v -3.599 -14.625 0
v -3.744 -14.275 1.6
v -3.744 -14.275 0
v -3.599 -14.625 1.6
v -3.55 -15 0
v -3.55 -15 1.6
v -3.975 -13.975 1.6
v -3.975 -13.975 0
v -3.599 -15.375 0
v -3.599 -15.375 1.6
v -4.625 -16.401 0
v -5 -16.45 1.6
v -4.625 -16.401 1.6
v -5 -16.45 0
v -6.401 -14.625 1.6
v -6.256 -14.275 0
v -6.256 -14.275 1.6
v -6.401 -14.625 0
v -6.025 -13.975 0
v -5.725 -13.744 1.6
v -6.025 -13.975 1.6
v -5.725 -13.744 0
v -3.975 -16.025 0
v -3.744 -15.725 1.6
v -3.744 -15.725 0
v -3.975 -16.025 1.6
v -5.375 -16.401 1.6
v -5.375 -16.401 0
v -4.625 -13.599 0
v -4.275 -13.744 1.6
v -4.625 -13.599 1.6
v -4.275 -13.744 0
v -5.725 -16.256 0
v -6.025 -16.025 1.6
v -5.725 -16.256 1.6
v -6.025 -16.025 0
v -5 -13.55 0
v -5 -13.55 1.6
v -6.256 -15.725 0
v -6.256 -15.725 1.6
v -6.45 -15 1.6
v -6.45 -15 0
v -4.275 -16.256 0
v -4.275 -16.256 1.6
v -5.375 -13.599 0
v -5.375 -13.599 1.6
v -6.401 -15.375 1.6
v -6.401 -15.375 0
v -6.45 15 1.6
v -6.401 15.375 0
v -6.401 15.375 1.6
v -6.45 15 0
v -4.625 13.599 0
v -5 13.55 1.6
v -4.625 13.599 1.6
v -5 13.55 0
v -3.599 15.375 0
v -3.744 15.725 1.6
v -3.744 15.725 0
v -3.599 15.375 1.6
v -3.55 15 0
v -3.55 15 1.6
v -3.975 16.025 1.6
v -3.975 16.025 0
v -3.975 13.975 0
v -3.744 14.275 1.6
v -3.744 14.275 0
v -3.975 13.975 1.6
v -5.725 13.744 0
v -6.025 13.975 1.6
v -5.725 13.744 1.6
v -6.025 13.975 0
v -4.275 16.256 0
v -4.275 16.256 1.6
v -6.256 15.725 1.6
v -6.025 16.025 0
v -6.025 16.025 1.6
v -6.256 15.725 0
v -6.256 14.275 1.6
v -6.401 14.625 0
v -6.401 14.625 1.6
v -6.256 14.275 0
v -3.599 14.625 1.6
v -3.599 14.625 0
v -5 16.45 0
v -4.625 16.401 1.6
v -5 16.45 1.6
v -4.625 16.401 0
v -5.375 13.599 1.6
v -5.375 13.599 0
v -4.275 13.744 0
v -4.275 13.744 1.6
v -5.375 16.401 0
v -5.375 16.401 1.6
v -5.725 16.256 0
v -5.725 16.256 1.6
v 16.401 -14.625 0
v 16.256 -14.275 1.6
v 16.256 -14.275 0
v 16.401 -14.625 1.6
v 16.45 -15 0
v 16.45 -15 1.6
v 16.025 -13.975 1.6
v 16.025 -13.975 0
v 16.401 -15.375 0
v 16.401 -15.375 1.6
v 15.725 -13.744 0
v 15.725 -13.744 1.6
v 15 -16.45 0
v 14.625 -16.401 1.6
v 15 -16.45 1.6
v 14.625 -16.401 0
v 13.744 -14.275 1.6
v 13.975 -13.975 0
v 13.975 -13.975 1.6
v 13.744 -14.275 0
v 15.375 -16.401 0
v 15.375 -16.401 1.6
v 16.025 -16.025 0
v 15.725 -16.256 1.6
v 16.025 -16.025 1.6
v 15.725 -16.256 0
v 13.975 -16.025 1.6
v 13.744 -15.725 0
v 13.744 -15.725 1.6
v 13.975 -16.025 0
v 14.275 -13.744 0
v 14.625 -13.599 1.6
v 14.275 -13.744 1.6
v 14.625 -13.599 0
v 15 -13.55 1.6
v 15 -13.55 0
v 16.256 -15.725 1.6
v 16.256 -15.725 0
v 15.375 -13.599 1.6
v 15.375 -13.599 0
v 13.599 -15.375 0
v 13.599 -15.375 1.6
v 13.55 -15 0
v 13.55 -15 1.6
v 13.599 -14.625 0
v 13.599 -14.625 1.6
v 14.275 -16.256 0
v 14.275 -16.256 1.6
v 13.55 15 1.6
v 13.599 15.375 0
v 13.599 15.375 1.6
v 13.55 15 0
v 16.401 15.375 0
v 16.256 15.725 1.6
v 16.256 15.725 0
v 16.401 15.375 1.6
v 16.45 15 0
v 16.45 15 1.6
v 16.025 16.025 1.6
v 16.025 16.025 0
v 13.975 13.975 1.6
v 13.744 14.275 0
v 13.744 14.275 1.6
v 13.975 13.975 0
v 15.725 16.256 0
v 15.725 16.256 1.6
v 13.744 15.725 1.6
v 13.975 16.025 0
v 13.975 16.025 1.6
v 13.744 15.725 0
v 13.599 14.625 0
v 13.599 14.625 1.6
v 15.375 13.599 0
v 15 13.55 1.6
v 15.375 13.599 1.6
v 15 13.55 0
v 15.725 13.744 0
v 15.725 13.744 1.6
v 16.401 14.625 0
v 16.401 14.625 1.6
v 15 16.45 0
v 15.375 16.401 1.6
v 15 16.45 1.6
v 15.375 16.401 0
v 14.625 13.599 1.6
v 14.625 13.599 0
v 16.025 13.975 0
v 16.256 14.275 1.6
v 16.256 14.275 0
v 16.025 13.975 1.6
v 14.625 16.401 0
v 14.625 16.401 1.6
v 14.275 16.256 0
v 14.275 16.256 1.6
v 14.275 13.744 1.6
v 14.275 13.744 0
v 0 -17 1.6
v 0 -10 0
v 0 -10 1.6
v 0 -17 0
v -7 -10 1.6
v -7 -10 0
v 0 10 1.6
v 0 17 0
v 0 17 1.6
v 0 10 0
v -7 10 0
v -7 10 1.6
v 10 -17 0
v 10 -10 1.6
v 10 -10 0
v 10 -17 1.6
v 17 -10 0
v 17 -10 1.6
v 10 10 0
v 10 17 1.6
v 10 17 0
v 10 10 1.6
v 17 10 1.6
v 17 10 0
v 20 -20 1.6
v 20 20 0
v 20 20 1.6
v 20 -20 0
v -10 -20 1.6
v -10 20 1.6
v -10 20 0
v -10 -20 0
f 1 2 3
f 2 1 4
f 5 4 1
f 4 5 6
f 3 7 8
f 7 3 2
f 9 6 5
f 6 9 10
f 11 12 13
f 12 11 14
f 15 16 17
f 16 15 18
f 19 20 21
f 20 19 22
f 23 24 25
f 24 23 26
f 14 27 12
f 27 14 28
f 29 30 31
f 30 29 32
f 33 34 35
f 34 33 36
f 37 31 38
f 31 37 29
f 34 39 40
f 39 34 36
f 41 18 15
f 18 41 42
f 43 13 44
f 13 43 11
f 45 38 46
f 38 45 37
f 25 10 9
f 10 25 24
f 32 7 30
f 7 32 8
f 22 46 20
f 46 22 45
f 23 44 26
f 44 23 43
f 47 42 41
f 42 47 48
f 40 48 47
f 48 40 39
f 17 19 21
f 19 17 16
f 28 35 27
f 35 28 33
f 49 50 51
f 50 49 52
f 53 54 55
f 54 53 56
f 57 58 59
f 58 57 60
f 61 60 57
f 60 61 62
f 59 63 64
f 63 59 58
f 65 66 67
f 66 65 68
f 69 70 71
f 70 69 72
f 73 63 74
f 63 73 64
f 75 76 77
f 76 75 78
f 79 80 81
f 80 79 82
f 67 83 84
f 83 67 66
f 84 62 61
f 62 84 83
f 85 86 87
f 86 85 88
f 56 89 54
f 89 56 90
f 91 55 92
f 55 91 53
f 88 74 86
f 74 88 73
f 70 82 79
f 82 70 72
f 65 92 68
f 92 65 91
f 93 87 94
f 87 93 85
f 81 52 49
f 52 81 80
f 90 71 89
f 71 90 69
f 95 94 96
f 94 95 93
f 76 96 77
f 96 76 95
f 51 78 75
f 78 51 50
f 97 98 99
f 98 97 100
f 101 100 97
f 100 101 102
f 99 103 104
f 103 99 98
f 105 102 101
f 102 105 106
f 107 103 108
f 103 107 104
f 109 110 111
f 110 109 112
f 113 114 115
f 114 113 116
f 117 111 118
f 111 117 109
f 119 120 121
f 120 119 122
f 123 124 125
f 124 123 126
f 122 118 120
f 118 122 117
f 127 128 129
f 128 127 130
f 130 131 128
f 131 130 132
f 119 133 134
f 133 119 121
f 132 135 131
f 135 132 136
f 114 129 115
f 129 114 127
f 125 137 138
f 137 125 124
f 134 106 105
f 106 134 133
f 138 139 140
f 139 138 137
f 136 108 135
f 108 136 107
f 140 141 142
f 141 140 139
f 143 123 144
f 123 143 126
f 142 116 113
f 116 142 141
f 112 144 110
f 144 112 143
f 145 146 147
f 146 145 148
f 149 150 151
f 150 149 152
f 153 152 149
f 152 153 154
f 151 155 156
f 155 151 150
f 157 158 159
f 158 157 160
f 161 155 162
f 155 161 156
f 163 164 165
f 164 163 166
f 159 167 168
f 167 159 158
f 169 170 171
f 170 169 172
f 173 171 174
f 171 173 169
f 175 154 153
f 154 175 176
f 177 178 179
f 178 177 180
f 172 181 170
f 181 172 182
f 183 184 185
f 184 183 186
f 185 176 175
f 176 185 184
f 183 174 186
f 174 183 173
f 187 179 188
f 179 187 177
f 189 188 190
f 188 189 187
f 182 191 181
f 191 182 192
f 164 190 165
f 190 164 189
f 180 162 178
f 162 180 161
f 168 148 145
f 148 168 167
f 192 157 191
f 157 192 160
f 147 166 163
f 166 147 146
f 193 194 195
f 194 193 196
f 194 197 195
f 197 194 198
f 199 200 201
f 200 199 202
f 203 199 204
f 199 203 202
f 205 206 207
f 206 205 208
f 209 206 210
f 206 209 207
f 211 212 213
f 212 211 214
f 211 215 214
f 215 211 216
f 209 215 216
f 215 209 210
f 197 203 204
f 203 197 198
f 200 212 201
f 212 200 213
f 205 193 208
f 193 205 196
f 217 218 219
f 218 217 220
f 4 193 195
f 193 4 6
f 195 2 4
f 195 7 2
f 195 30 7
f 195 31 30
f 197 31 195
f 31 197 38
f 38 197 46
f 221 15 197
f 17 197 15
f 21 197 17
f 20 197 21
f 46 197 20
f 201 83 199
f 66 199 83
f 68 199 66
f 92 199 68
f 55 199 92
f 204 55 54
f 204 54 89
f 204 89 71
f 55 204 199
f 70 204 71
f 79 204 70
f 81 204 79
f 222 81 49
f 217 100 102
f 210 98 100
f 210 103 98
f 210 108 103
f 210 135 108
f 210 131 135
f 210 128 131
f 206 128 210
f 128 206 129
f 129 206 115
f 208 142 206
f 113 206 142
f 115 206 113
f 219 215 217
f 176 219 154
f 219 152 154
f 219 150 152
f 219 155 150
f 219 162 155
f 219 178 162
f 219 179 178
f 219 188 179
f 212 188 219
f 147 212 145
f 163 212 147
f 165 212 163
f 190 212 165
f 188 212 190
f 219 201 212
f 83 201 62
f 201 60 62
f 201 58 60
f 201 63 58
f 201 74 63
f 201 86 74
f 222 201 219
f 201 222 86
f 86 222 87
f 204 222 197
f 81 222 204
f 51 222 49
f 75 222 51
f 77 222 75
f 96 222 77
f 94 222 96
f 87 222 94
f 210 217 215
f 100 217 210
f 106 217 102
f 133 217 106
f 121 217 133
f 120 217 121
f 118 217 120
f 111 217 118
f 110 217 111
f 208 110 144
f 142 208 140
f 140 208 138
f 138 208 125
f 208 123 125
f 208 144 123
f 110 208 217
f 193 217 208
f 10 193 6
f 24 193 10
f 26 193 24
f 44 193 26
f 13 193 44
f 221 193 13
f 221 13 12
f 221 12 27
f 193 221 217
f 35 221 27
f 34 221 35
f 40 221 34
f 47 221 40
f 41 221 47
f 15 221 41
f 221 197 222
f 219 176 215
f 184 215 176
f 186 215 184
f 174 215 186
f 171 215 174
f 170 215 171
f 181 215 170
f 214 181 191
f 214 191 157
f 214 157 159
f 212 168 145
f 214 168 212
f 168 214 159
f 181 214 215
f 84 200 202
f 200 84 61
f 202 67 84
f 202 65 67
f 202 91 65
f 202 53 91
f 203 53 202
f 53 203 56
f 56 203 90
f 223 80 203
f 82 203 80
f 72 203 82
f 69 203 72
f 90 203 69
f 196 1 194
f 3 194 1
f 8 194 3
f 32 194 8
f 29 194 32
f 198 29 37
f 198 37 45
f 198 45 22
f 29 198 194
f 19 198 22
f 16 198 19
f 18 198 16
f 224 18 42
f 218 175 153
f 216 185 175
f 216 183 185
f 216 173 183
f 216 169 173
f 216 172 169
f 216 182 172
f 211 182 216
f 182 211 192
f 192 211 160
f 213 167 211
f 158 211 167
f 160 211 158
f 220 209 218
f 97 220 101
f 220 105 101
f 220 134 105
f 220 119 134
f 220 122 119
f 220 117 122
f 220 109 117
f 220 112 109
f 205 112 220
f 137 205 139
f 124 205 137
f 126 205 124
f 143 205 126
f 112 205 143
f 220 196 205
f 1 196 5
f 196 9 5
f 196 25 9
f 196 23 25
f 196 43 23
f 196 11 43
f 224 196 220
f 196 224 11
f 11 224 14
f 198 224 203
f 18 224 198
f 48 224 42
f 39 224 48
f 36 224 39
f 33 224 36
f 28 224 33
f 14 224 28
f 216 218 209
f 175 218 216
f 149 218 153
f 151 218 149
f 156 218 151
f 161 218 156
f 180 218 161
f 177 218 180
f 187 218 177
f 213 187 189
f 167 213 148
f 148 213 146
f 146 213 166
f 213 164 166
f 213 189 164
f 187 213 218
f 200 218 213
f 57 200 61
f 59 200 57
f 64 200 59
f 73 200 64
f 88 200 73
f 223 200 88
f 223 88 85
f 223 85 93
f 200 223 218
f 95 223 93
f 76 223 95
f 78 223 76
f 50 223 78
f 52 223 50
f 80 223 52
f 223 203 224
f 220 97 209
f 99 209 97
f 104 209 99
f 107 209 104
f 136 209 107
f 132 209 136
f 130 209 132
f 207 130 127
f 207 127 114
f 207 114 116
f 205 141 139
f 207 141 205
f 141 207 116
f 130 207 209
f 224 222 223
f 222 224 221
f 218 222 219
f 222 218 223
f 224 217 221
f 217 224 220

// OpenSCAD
// file: ../../screw-post/screw-post.scad
//-----------------------------------------------------------------------
// Screw post: a round post off the floor that a board screws down onto
//
// Two ways to fix:
//   "nut"  clearance hole through the post and floor; the nut sits in a hex
//          trap in the floor's underside, so the screw goes in from the top
//   "tap"  a pilot hole the screw cuts its own thread in (one or two fittings
//          in PLA/PETG); blind, the floor stays whole underneath
// and "head" for a screw up from below (head in a counterbore, nut on top).
//
// Modules, all in the same frame:
//   screwPostGhost()     the screw (and nut), for previews
//   screwPost()          the post: add to the floor
//   screwPostFloorCut()  subtract from the floor: nut trap / counterbore and hole
//
// Frame: origin on the floor top, on the post's axis. Z up; the floor is
// Z = -floorThick .. 0. Units: mm.
//
// Sizes: "M2", "M2.5", "M3". screwPostScrew(size, ...) says which screw length
// reaches, so a project can assert it has that screw in the kit.
//-----------------------------------------------------------------------

//-- [name, screw Ø, nut across flats, nut thick, head Ø, head height, tap hole, post Ø]
//-- Nuts ISO 4032; heads ISO 7380 button. Tap holes: the usual ~0.8 x Ø for plastic
screwSizes = [
  ["M2",   2.0, 4.0, 1.6, 3.5, 1.1, 1.6, 5.0],
  ["M2.5", 2.5, 5.0, 2.0, 4.4, 1.4, 2.1, 6.0],    // head 4.4: measured on the kit's M2.5 (controller base)
  ["M3",   3.0, 5.5, 2.4, 5.7, 1.65, 2.5, 7.0],
];

screwHoleClear = 0.4;     // added to the screw Ø for a clearance hole
screwNutClear  = 0.3;     // CAL: across flats, nut trap over the nut. Set by the fit piece
screwTapClear  = 0.0;     // CAL: added to the tap hole. Set by the fit piece
screwHeadClear = 0.6;     // counterbore over the head Ø

function screwSize(size) = let (i = search([size], screwSizes)[0])
  assert(i != [] && i != undef, str("unknown screw size ", size)) screwSizes[i];
function screwDia(size)    = screwSize(size)[1];
function screwNutAF(size)  = screwSize(size)[2];
function screwNutH(size)   = screwSize(size)[3];
function screwHeadDia(size)= screwSize(size)[4];
function screwHeadH(size)  = screwSize(size)[5];
function screwPostDia(size)= screwSize(size)[7];

//-- Shortest screw that fills the nut, from the top of the clamped part (h + clamp
//-- above the floor) down to the nut trap's underside. Round up to a length you have.
function screwPostScrew(size, h, floorThick, clamp = 1.6) = h + clamp + floorThick;

module screwPostGhost(size, h, floorThick, clamp = 1.6, length, how = "nut")
{
  d = screwDia(size);
  L = is_undef(length) ? screwPostScrew(size, h, floorThick, clamp) : length;
  top = h + clamp;
  if (how == "head")
  {
    %color("Silver") translate([0, 0, -floorThick]) cylinder(d = screwHeadDia(size), h = screwHeadH(size), $fn = 24);
    %color("Silver") translate([0, 0, -floorThick + screwHeadH(size)]) cylinder(d = d, h = L, $fn = 16);
  }
  else
  {
    %color("Silver") translate([0, 0, top]) cylinder(d = screwHeadDia(size), h = screwHeadH(size), $fn = 24);
    %color("Silver") translate([0, 0, top - L]) cylinder(d = d, h = L, $fn = 16);
    if (how == "nut")
      %color("DimGray") translate([0, 0, -floorThick]) rotate([0, 0, 30]) cylinder(d = screwNutAF(size)/cos(30), h = screwNutH(size), $fn = 6);
  }
}

//-- how: "nut" | "head" (through hole) or "tap" (blind pilot hole). postDia defaults by size
module screwPost(size, h, how = "nut", postDia, tapClear = screwTapClear)
{
  pd = is_undef(postDia) ? screwPostDia(size) : postDia;
  hole = how == "tap" ? screwSize(size)[6] + tapClear : screwDia(size) + screwHoleClear;
  difference()
  {
    translate([0, 0, -0.01]) cylinder(d = pd, h = h + 0.01, $fn = 40);
    translate([0, 0, how == "tap" ? 0.6 : -1]) cylinder(d = hole, h = h + 2, $fn = 24);
    //-- lead-in so the screw starts square
    translate([0, 0, h - 0.4]) cylinder(d1 = hole, d2 = hole + 0.8, h = 0.41, $fn = 24);
  }
}

//-- "nut": hex trap from the underside, opening a little over the nut so it sits flush.
//-- "head": counterbore for the head. "tap": nothing.
module screwPostFloorCut(size, floorThick, how = "nut", nutClear = screwNutClear)
{
  d = screwDia(size) + screwHoleClear;
  if (how == "nut")
  {
    af = screwNutAF(size) + nutClear;
    translate([0, 0, -floorThick - 1]) rotate([0, 0, 30]) cylinder(d = af/cos(30), h = screwNutH(size) + 0.1 + 1, $fn = 6);
    translate([0, 0, -floorThick - 1]) cylinder(d = d + 0.4, h = floorThick + 2, $fn = 24);
  }
  if (how == "head")
  {
    translate([0, 0, -floorThick - 1]) cylinder(d = screwHeadDia(size) + screwHeadClear, h = screwHeadH(size) + 0.2 + 1, $fn = 32);
    translate([0, 0, -floorThick - 1]) cylinder(d = d + 0.4, h = floorThick + 2, $fn = 24);
  }
  assert(how == "tap" || floorThick >= (how == "nut" ? screwNutH(size) : screwHeadH(size)) + 0.1 + 0.3,
         str("floor too thin for the ", size, " ", how));
}
// main file
// A 3 x 4 carrier sitting on the 6 x 6 bench, for the catalogue: flat on the bench,
// its -X -Y hole on bench grid point (2, 1).
use <../carrier.scad>

bx = 6; by = 6;
nx = 3; ny = 4;
at = crOnBench(bx, by, nx, ny, 2, 1);

translate([at[0], at[1], crSeatZ("bench")]) carrierPlate(nx, ny);
